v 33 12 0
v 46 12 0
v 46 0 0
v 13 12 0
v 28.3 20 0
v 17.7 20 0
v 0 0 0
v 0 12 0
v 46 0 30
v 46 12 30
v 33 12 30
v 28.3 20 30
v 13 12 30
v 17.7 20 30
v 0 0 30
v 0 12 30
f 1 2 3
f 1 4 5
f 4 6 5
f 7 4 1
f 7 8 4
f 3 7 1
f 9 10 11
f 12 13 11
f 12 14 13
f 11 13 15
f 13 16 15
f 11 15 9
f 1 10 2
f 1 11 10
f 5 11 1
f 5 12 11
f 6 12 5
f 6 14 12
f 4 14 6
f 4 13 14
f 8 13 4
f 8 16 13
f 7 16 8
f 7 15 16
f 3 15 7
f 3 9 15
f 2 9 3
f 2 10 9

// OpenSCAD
$fn = 32;

// ----------------------------------------------------------------------
// V guide rail: dovetail, 46 mm wide
// ----------------------------------------------------------------------

// --- parameters (mm) ---
rail_w = 46;              // rail width, X
base_t = 12;              // base plate thickness
v_depth = 8;              // V feature depth / height
v_half_w = 10;            // half width of the V at the base face
plate_t = 30;             // rail length, Z (the extrusion height)
top_half_w = 5.3;         // half width at the dovetail top

dovetail_base = 2 * v_half_w;  // dovetail width at the base
dovetail_top = 2 * top_half_w;  // dovetail width at the top

profile = [[0, 0], [46, 0], [46, 12], [33, 12], [28.3, 20], [17.7, 20], [13, 12], [0, 12]];  // primary outline, 8 points, counter clockwise

// --- the one profile operation ---
linear_extrude(height = plate_t) polygon(points = profile);
